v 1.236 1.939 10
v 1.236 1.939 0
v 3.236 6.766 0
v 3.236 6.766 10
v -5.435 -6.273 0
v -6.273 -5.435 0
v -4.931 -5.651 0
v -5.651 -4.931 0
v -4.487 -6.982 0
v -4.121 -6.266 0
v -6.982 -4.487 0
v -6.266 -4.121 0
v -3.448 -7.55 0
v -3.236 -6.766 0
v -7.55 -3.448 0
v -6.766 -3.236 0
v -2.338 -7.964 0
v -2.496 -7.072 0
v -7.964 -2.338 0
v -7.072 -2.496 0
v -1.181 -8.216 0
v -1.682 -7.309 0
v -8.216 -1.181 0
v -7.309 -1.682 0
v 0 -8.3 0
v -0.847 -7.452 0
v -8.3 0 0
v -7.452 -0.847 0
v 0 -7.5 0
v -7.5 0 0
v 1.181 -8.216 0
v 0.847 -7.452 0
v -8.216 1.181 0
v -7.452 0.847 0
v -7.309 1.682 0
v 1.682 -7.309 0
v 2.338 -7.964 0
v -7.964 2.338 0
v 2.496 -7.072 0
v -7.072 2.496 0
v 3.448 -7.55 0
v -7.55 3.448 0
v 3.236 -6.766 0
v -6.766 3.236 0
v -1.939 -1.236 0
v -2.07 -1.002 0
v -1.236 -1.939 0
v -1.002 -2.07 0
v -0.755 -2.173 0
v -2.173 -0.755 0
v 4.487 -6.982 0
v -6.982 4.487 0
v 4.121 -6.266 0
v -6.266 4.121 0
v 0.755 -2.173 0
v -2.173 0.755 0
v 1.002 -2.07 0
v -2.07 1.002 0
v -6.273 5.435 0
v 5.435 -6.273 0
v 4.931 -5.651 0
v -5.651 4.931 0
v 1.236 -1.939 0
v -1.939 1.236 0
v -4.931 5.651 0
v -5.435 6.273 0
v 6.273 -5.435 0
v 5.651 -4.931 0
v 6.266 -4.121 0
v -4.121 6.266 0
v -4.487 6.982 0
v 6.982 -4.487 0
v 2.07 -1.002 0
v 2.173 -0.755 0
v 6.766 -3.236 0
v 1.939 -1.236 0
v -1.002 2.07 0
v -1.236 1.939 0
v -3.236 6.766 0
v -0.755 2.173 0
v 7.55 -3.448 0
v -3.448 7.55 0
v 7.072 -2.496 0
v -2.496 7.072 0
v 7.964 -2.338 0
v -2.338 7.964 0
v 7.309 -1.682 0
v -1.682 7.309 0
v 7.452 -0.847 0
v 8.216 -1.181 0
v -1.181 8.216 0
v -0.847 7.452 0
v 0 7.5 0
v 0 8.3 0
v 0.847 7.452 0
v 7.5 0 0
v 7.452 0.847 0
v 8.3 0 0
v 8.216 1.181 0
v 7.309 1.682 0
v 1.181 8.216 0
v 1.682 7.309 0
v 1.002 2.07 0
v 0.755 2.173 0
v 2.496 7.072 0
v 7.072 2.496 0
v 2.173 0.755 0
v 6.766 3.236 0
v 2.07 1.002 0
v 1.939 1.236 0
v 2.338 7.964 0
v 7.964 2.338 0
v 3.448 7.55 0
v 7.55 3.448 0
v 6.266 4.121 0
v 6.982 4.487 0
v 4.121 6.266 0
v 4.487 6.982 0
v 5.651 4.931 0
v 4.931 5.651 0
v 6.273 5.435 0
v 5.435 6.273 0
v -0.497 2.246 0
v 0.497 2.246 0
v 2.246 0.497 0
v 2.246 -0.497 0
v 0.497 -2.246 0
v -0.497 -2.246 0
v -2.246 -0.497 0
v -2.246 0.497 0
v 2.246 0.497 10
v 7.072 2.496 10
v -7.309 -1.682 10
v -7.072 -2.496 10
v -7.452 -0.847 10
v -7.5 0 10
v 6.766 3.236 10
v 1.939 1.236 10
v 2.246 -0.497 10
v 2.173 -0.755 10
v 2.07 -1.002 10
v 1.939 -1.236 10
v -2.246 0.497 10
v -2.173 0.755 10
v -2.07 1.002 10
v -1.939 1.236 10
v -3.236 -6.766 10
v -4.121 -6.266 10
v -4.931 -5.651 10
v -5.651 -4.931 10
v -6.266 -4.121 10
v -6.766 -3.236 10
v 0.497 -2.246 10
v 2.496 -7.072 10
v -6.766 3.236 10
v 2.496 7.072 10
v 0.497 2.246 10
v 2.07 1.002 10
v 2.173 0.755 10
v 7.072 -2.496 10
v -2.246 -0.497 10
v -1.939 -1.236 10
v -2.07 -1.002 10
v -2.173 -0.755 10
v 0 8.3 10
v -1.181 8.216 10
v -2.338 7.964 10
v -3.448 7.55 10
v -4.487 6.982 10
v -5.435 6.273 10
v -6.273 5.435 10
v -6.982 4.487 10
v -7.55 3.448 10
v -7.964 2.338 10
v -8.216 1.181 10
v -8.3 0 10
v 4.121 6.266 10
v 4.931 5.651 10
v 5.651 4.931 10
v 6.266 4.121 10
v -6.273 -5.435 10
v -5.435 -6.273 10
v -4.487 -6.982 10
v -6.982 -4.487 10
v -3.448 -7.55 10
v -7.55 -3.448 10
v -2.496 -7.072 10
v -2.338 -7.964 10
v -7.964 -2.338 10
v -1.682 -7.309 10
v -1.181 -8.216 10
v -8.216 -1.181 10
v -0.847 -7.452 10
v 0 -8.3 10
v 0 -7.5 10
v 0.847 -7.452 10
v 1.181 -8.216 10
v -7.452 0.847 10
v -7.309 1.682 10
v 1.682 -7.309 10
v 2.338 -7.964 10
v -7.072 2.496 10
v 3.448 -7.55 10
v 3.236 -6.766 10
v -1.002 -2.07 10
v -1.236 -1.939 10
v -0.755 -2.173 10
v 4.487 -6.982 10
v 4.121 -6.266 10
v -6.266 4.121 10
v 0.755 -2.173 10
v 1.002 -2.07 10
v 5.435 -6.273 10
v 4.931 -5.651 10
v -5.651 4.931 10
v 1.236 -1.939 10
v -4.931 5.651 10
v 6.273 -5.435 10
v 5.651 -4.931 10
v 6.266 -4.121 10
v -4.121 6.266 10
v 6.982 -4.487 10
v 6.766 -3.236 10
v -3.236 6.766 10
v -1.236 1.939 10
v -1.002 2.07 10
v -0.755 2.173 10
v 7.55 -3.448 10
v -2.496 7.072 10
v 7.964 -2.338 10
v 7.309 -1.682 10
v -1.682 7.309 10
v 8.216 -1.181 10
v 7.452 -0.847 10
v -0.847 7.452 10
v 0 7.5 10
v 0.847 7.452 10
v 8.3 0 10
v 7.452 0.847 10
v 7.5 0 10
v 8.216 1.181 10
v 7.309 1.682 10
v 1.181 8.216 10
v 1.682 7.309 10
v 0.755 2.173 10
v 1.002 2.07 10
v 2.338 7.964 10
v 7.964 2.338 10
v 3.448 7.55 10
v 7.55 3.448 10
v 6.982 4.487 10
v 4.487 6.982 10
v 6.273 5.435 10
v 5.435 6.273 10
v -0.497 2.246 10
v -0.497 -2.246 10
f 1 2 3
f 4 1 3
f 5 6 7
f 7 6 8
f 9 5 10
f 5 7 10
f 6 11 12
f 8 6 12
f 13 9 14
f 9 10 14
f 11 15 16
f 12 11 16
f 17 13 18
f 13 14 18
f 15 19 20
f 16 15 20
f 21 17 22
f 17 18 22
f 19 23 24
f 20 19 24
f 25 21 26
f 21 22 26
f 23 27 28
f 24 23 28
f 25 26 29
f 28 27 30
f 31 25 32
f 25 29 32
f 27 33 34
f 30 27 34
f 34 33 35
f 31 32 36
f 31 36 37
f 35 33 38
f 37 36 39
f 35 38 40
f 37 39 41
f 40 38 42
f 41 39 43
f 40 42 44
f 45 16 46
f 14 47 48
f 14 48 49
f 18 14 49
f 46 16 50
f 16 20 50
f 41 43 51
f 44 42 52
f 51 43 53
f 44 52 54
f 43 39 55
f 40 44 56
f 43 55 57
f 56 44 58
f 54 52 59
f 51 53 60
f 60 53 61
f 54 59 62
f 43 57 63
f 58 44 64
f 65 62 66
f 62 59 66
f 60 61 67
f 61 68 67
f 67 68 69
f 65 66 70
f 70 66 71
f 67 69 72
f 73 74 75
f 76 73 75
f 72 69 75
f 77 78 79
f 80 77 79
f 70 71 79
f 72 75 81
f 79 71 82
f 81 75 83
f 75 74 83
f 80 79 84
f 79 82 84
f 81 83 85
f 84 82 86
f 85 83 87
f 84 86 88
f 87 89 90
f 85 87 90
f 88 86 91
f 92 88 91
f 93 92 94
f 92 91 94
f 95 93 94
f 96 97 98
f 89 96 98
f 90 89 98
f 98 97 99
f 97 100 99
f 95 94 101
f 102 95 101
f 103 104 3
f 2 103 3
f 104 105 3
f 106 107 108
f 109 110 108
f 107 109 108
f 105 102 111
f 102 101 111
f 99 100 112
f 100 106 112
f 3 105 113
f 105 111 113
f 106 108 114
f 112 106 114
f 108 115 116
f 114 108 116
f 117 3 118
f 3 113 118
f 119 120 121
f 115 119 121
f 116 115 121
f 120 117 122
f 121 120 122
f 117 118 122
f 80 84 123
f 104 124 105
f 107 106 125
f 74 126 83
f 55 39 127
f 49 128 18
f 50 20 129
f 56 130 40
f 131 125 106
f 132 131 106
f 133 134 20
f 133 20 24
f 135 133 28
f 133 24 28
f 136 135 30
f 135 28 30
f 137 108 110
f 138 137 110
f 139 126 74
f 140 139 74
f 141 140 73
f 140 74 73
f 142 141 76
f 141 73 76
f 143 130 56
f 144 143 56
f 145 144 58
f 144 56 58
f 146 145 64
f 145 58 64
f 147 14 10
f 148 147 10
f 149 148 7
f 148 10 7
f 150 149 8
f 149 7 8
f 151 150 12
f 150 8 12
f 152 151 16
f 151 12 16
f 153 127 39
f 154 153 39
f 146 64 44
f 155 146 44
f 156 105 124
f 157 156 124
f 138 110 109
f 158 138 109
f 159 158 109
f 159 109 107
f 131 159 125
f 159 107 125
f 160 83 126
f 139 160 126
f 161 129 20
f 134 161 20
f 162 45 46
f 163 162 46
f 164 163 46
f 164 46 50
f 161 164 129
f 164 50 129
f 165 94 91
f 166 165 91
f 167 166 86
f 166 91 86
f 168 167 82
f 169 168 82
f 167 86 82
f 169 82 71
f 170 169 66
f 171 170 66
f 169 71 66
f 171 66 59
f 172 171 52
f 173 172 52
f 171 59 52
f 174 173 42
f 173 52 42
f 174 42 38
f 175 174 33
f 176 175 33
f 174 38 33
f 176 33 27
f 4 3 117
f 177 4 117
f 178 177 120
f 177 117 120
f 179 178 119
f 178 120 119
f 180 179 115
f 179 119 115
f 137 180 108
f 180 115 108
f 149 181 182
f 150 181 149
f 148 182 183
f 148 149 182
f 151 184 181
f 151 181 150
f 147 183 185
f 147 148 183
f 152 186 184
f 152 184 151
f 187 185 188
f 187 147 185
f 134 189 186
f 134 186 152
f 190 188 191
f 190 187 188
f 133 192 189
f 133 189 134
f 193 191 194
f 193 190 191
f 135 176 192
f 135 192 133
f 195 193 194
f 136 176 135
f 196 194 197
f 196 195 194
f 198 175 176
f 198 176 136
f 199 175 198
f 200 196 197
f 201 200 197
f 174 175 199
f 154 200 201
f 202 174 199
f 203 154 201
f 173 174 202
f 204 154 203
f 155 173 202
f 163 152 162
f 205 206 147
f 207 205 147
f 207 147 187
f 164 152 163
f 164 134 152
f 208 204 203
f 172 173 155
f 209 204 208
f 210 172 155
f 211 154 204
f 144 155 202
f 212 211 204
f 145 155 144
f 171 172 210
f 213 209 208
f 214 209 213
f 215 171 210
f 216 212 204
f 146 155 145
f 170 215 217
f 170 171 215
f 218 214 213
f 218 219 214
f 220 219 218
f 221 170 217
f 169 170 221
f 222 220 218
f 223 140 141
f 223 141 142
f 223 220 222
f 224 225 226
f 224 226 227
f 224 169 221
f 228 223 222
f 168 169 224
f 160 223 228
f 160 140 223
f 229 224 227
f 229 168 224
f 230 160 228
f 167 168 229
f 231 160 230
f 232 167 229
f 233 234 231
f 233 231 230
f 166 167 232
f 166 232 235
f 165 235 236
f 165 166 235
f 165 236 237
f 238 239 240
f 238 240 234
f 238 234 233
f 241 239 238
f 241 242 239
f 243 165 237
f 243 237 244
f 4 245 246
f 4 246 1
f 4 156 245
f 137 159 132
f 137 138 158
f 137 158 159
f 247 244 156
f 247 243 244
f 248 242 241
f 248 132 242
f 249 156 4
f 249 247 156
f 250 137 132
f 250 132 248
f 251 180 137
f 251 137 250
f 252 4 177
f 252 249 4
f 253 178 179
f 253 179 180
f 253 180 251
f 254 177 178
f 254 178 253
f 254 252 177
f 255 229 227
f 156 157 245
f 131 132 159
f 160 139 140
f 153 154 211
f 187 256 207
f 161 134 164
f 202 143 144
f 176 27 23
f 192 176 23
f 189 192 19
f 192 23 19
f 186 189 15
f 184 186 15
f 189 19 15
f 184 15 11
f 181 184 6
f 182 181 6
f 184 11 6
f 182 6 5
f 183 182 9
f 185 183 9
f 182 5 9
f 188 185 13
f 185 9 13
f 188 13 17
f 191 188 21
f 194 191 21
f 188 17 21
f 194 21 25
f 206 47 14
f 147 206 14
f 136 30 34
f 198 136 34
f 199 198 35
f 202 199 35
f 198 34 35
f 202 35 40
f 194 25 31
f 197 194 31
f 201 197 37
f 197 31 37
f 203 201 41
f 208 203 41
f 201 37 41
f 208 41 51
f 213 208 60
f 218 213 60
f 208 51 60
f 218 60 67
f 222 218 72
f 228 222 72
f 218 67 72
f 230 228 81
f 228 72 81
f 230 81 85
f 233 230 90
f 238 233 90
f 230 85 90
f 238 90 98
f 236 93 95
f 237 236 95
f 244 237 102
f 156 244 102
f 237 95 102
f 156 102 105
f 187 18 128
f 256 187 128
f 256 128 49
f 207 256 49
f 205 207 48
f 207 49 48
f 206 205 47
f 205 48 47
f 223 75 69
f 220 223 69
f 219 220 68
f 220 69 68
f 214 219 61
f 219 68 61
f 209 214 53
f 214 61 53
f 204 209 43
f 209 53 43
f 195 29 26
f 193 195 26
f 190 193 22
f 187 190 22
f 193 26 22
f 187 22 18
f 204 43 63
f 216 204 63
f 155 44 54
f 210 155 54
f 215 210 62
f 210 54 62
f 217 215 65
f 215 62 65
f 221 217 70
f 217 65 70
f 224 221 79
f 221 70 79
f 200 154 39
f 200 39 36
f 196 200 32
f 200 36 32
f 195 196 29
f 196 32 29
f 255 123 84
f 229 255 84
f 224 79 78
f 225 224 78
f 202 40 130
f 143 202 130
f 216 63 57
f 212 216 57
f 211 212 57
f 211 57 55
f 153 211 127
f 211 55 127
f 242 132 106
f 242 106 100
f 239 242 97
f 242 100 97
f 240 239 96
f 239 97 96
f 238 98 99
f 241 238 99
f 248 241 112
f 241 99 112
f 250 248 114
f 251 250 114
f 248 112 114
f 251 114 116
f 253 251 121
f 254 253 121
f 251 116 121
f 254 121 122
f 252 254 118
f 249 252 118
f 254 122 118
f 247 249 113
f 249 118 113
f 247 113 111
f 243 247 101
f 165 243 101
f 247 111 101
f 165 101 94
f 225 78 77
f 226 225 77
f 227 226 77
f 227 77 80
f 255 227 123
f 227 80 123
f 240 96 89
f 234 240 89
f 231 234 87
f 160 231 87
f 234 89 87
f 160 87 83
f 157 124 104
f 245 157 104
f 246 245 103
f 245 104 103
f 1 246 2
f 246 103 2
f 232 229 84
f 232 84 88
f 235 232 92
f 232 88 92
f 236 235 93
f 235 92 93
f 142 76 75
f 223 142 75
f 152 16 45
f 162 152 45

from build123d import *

# Parameters (mm, degrees)
F1_DEPTH = 10


with BuildPart() as f1:
    # F0 (on Top) → F1 (new body)
    with BuildSketch(Plane.XY):
        with BuildLine():
            ThreePointArc((8.3, 0), (5.868986, 5.868986), (0, 8.3))
            ThreePointArc((0, 8.3), (-5.868986, 5.868986), (-8.3, 0))
            ThreePointArc((-8.3, 0), (-5.868986, -5.868986), (0, -8.3))
            ThreePointArc((0, -8.3), (5.868986, -5.868986), (8.3, 0))
        make_face()
        with BuildLine():
            ThreePointArc((-2.496489, 7.072308), (-1.26643, 7.392304), (0, 7.5))
            ThreePointArc((0, 7.5), (1.26643, 7.392304), (2.496489, 7.072308))
            Line((2.496489, 7.072308), (0.497207, 2.245615))
            ThreePointArc((0.497207, 2.245615), (0.880172, 2.124923), (1.236311, 1.939468))
            Line((1.236311, 1.939468), (3.235593, 6.766161))
            ThreePointArc((3.235593, 6.766161), (5.303301, 5.303301), (6.766161, 3.235593))
            Line((6.766161, 3.235593), (1.939468, 1.236311))
            ThreePointArc((1.939468, 1.236311), (2.124923, 0.880172), (2.245615, 0.497207))
            Line((2.245615, 0.497207), (7.072308, 2.496489))
            ThreePointArc((7.072308, 2.496489), (7.392304, 1.26643), (7.5, 0))
            ThreePointArc((7.5, 0), (7.392304, -1.26643), (7.072308, -2.496489))
            Line((7.072308, -2.496489), (2.245615, -0.497207))
            ThreePointArc((2.245615, -0.497207), (2.124923, -0.880172), (1.939468, -1.236311))
            Line((1.939468, -1.236311), (6.766161, -3.235593))
            ThreePointArc((6.766161, -3.235593), (5.303301, -5.303301), (3.235593, -6.766161))
            Line((3.235593, -6.766161), (1.236311, -1.939468))
            ThreePointArc((1.236311, -1.939468), (0.880172, -2.124923), (0.497207, -2.245615))
            Line((0.497207, -2.245615), (2.496489, -7.072308))
            ThreePointArc((2.496489, -7.072308), (1.26643, -7.392304), (0, -7.5))
            ThreePointArc((0, -7.5), (-1.26643, -7.392304), (-2.496489, -7.072308))
            Line((-2.496489, -7.072308), (-0.497207, -2.245615))
            ThreePointArc((-0.497207, -2.245615), (-0.880172, -2.124923), (-1.236311, -1.939468))
            Line((-1.236311, -1.939468), (-3.235593, -6.766161))
            ThreePointArc((-3.235593, -6.766161), (-5.303301, -5.303301), (-6.766161, -3.235593))
            Line((-6.766161, -3.235593), (-1.939468, -1.236311))
            ThreePointArc((-1.939468, -1.236311), (-2.124923, -0.880172), (-2.245615, -0.497207))
            Line((-2.245615, -0.497207), (-7.072308, -2.496489))
            ThreePointArc((-7.072308, -2.496489), (-7.392304, -1.26643), (-7.5, 0))
            ThreePointArc((-7.5, 0), (-7.392304, 1.26643), (-7.072308, 2.496489))
            Line((-7.072308, 2.496489), (-2.245615, 0.497207))
            ThreePointArc((-2.245615, 0.497207), (-2.124923, 0.880172), (-1.939468, 1.236311))
            Line((-1.939468, 1.236311), (-6.766161, 3.235593))
            ThreePointArc((-6.766161, 3.235593), (-5.303301, 5.303301), (-3.235593, 6.766161))
            Line((-3.235593, 6.766161), (-1.236311, 1.939468))
            ThreePointArc((-1.236311, 1.939468), (-0.880172, 2.124923), (-0.497207, 2.245615))
            Line((-0.497207, 2.245615), (-2.496489, 7.072308))
        make_face(mode=Mode.SUBTRACT)
    extrude(amount=F1_DEPTH)


solid = f1.part
